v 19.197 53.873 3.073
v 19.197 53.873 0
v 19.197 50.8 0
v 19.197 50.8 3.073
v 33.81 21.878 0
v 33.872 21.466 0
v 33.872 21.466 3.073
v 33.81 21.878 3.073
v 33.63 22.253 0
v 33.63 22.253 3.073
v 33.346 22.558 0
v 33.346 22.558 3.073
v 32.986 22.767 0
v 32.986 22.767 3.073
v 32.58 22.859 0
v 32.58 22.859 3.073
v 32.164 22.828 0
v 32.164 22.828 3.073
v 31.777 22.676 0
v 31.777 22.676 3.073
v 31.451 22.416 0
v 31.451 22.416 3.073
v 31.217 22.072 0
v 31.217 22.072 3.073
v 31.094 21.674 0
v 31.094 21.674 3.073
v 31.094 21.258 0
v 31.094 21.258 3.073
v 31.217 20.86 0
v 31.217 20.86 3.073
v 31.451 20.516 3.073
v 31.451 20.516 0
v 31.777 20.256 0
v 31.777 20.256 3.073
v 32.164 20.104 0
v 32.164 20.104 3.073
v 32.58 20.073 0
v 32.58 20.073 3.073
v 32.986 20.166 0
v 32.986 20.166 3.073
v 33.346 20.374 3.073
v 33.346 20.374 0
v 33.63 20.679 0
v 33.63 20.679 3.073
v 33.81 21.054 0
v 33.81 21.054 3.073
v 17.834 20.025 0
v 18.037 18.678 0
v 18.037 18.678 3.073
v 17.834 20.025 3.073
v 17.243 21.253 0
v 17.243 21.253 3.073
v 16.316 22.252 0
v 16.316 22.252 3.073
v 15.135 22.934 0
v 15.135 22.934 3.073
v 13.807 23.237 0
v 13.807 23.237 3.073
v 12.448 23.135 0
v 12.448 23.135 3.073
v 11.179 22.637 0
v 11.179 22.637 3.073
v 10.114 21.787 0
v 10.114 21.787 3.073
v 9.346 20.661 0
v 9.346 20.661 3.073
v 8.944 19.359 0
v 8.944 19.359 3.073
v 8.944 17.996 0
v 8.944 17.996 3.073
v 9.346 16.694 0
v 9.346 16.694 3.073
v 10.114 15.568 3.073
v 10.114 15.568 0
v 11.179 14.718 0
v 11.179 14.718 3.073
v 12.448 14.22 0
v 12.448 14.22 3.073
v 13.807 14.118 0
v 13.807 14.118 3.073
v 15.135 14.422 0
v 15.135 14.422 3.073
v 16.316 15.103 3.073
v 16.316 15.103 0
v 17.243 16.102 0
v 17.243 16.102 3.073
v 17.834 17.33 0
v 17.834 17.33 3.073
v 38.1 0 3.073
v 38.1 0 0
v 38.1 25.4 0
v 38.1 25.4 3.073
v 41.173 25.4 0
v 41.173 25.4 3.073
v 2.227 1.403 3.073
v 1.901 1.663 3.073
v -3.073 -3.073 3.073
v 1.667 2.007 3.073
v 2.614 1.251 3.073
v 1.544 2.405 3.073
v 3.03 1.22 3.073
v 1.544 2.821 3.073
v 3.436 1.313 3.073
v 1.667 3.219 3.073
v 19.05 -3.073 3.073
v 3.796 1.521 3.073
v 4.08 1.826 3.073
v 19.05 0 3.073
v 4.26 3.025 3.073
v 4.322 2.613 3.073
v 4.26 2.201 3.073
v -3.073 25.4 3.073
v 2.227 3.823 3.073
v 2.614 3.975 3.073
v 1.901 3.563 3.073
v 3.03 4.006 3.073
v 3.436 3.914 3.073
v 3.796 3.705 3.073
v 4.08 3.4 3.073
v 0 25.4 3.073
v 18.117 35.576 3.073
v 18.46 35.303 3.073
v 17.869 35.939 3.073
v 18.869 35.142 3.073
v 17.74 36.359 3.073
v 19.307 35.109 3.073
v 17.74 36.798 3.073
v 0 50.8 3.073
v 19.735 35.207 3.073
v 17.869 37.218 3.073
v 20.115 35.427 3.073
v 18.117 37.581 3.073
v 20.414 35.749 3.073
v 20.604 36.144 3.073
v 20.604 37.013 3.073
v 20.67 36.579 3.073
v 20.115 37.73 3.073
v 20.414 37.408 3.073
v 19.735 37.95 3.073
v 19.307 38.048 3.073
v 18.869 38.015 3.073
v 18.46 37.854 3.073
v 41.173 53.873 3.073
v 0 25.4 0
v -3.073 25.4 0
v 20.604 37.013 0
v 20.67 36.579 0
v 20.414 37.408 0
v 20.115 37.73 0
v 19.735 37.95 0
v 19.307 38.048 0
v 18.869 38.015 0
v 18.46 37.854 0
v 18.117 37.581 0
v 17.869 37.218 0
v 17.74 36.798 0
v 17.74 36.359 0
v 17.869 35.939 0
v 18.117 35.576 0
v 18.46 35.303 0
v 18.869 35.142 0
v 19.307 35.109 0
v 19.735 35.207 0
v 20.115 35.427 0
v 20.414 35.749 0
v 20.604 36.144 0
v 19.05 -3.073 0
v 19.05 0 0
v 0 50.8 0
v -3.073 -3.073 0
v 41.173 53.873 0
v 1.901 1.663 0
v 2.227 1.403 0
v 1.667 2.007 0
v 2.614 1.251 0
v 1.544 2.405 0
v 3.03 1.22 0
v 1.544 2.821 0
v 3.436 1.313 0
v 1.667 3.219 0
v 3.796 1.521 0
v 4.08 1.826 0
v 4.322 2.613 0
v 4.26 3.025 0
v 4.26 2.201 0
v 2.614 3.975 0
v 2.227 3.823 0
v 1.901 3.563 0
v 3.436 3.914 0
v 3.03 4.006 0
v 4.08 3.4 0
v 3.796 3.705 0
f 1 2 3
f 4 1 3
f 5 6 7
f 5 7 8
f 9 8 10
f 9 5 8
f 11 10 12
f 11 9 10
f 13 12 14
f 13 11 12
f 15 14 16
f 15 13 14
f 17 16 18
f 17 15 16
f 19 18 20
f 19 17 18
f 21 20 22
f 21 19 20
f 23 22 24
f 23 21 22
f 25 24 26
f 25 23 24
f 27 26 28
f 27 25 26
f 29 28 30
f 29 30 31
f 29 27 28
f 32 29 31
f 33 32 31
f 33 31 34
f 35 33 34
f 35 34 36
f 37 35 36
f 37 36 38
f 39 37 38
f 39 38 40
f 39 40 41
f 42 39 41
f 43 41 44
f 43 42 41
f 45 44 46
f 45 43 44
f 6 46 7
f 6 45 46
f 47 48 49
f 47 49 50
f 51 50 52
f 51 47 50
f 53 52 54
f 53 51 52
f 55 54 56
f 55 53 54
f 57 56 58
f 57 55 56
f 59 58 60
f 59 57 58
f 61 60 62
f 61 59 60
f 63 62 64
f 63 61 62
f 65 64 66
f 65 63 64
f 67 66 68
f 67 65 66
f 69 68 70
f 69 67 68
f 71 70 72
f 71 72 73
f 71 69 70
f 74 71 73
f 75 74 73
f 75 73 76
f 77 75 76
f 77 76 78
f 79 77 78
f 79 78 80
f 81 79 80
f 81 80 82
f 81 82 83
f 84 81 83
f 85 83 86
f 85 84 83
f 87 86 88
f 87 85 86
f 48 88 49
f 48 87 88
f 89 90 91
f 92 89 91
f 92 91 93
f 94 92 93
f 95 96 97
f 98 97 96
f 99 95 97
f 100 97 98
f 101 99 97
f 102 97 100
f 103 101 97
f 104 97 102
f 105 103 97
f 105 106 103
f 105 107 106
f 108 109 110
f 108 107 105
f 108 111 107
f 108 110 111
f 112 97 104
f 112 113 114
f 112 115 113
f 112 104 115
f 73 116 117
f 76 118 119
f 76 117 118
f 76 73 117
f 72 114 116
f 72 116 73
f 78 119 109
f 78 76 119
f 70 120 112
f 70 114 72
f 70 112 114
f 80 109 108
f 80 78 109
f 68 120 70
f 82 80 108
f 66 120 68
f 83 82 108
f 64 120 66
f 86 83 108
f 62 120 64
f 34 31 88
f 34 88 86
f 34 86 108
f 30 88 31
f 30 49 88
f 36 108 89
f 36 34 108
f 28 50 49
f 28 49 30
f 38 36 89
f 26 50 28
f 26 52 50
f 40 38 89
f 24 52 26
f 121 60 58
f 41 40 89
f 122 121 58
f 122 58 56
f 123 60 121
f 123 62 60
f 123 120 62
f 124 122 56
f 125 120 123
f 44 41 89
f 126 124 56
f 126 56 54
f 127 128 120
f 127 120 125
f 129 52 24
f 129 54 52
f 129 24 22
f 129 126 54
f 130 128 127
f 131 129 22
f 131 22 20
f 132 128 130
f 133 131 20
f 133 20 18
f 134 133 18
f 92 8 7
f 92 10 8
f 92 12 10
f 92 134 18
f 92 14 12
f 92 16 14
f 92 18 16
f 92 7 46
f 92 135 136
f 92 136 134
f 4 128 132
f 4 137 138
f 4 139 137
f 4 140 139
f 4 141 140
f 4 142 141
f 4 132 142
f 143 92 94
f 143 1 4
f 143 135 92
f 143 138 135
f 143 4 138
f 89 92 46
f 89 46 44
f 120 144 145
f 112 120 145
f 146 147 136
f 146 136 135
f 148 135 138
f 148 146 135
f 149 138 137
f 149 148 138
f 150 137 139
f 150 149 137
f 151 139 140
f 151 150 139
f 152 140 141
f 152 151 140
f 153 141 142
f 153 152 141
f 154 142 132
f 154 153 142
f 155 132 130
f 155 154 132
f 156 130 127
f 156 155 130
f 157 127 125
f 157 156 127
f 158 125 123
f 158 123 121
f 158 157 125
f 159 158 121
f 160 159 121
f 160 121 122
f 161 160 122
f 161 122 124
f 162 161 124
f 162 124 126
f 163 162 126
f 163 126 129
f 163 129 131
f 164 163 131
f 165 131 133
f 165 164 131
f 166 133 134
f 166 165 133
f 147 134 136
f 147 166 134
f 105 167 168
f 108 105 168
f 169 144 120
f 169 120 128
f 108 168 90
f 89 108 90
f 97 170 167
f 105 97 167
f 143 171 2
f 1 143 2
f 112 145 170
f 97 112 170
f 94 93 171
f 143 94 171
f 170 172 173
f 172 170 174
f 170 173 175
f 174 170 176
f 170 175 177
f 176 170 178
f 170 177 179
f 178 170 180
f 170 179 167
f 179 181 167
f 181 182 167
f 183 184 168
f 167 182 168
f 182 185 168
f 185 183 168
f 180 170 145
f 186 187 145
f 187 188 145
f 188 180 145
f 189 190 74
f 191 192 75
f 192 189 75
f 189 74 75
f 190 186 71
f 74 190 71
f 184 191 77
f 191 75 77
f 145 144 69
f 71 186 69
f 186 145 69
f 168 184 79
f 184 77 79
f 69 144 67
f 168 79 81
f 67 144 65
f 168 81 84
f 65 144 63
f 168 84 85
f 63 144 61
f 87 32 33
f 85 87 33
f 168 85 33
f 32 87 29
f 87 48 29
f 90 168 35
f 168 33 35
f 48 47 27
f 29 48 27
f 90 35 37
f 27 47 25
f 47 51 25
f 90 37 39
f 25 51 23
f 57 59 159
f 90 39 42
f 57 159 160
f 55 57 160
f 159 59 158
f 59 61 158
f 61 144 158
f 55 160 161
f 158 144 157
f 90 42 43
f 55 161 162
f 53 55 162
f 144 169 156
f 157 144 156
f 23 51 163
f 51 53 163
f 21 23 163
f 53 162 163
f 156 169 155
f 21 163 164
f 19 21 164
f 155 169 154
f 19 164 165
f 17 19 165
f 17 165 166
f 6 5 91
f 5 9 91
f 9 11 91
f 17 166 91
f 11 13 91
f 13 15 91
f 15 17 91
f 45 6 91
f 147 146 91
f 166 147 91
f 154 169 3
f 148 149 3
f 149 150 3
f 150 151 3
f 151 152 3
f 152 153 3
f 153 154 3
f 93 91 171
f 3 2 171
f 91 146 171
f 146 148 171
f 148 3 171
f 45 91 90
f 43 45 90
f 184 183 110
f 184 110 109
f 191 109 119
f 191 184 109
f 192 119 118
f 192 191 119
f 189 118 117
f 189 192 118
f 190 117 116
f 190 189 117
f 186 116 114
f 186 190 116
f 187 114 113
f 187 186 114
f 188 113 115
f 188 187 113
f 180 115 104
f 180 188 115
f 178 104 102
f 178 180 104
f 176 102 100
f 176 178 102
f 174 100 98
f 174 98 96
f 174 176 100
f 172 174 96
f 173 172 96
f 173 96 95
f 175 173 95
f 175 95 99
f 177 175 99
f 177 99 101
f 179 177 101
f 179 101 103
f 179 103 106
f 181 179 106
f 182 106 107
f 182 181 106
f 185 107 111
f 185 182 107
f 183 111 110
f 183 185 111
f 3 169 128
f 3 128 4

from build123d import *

# Parameters (mm, degrees)
BACKSKETCH_W        = 38.1
BACKSKETCH_H        = 50.8
BACKSKETCH_R        = 1.4732
BACKSKETCH_R_2      = 4.572
BACKSKETCH_R_3      = 1.397
BOSS_EXTRUDE1_DEPTH = 3.0734


with BuildPart() as part:
    # backSketch → Boss-Extrude1 (new body)
    # profile 1 of 3: a face of its own
    with BuildSketch(Plane.XY):
        Polygon((38.1, 50.8), (38.1, 25.4), (41.1734, 25.4), (41.1734, 53.8734), (19.196716748, 53.8734), (19.196716748, 50.8), align=None)
    # profile 2 of 3: a face of its own
    with BuildSketch(Plane.XY):
        Polygon((19.05, 0), (0, 0), (0, 25.4), (-3.0734, 25.4), (-3.0734, -3.0734), (19.05, -3.0734), align=None)
    # profile 3 of 3: a face of its own
    with BuildSketch(Plane.XY):
        with Locations((19.05, 25.4)):
            Rectangle(BACKSKETCH_W, BACKSKETCH_H)
        with Locations((19.196716748, 36.578509469)):
            Circle(BACKSKETCH_R, mode=Mode.SUBTRACT)
        with Locations((13.465150567, 18.677705992)):
            Circle(BACKSKETCH_R_2, mode=Mode.SUBTRACT)
        with Locations((32.475268488, 21.466248377)):
            Circle(BACKSKETCH_R_3, mode=Mode.SUBTRACT)
        with Locations((2.925293214, 2.613087759)):
            Circle(BACKSKETCH_R_3, mode=Mode.SUBTRACT)
    extrude(amount=BOSS_EXTRUDE1_DEPTH)


solid = part.part
